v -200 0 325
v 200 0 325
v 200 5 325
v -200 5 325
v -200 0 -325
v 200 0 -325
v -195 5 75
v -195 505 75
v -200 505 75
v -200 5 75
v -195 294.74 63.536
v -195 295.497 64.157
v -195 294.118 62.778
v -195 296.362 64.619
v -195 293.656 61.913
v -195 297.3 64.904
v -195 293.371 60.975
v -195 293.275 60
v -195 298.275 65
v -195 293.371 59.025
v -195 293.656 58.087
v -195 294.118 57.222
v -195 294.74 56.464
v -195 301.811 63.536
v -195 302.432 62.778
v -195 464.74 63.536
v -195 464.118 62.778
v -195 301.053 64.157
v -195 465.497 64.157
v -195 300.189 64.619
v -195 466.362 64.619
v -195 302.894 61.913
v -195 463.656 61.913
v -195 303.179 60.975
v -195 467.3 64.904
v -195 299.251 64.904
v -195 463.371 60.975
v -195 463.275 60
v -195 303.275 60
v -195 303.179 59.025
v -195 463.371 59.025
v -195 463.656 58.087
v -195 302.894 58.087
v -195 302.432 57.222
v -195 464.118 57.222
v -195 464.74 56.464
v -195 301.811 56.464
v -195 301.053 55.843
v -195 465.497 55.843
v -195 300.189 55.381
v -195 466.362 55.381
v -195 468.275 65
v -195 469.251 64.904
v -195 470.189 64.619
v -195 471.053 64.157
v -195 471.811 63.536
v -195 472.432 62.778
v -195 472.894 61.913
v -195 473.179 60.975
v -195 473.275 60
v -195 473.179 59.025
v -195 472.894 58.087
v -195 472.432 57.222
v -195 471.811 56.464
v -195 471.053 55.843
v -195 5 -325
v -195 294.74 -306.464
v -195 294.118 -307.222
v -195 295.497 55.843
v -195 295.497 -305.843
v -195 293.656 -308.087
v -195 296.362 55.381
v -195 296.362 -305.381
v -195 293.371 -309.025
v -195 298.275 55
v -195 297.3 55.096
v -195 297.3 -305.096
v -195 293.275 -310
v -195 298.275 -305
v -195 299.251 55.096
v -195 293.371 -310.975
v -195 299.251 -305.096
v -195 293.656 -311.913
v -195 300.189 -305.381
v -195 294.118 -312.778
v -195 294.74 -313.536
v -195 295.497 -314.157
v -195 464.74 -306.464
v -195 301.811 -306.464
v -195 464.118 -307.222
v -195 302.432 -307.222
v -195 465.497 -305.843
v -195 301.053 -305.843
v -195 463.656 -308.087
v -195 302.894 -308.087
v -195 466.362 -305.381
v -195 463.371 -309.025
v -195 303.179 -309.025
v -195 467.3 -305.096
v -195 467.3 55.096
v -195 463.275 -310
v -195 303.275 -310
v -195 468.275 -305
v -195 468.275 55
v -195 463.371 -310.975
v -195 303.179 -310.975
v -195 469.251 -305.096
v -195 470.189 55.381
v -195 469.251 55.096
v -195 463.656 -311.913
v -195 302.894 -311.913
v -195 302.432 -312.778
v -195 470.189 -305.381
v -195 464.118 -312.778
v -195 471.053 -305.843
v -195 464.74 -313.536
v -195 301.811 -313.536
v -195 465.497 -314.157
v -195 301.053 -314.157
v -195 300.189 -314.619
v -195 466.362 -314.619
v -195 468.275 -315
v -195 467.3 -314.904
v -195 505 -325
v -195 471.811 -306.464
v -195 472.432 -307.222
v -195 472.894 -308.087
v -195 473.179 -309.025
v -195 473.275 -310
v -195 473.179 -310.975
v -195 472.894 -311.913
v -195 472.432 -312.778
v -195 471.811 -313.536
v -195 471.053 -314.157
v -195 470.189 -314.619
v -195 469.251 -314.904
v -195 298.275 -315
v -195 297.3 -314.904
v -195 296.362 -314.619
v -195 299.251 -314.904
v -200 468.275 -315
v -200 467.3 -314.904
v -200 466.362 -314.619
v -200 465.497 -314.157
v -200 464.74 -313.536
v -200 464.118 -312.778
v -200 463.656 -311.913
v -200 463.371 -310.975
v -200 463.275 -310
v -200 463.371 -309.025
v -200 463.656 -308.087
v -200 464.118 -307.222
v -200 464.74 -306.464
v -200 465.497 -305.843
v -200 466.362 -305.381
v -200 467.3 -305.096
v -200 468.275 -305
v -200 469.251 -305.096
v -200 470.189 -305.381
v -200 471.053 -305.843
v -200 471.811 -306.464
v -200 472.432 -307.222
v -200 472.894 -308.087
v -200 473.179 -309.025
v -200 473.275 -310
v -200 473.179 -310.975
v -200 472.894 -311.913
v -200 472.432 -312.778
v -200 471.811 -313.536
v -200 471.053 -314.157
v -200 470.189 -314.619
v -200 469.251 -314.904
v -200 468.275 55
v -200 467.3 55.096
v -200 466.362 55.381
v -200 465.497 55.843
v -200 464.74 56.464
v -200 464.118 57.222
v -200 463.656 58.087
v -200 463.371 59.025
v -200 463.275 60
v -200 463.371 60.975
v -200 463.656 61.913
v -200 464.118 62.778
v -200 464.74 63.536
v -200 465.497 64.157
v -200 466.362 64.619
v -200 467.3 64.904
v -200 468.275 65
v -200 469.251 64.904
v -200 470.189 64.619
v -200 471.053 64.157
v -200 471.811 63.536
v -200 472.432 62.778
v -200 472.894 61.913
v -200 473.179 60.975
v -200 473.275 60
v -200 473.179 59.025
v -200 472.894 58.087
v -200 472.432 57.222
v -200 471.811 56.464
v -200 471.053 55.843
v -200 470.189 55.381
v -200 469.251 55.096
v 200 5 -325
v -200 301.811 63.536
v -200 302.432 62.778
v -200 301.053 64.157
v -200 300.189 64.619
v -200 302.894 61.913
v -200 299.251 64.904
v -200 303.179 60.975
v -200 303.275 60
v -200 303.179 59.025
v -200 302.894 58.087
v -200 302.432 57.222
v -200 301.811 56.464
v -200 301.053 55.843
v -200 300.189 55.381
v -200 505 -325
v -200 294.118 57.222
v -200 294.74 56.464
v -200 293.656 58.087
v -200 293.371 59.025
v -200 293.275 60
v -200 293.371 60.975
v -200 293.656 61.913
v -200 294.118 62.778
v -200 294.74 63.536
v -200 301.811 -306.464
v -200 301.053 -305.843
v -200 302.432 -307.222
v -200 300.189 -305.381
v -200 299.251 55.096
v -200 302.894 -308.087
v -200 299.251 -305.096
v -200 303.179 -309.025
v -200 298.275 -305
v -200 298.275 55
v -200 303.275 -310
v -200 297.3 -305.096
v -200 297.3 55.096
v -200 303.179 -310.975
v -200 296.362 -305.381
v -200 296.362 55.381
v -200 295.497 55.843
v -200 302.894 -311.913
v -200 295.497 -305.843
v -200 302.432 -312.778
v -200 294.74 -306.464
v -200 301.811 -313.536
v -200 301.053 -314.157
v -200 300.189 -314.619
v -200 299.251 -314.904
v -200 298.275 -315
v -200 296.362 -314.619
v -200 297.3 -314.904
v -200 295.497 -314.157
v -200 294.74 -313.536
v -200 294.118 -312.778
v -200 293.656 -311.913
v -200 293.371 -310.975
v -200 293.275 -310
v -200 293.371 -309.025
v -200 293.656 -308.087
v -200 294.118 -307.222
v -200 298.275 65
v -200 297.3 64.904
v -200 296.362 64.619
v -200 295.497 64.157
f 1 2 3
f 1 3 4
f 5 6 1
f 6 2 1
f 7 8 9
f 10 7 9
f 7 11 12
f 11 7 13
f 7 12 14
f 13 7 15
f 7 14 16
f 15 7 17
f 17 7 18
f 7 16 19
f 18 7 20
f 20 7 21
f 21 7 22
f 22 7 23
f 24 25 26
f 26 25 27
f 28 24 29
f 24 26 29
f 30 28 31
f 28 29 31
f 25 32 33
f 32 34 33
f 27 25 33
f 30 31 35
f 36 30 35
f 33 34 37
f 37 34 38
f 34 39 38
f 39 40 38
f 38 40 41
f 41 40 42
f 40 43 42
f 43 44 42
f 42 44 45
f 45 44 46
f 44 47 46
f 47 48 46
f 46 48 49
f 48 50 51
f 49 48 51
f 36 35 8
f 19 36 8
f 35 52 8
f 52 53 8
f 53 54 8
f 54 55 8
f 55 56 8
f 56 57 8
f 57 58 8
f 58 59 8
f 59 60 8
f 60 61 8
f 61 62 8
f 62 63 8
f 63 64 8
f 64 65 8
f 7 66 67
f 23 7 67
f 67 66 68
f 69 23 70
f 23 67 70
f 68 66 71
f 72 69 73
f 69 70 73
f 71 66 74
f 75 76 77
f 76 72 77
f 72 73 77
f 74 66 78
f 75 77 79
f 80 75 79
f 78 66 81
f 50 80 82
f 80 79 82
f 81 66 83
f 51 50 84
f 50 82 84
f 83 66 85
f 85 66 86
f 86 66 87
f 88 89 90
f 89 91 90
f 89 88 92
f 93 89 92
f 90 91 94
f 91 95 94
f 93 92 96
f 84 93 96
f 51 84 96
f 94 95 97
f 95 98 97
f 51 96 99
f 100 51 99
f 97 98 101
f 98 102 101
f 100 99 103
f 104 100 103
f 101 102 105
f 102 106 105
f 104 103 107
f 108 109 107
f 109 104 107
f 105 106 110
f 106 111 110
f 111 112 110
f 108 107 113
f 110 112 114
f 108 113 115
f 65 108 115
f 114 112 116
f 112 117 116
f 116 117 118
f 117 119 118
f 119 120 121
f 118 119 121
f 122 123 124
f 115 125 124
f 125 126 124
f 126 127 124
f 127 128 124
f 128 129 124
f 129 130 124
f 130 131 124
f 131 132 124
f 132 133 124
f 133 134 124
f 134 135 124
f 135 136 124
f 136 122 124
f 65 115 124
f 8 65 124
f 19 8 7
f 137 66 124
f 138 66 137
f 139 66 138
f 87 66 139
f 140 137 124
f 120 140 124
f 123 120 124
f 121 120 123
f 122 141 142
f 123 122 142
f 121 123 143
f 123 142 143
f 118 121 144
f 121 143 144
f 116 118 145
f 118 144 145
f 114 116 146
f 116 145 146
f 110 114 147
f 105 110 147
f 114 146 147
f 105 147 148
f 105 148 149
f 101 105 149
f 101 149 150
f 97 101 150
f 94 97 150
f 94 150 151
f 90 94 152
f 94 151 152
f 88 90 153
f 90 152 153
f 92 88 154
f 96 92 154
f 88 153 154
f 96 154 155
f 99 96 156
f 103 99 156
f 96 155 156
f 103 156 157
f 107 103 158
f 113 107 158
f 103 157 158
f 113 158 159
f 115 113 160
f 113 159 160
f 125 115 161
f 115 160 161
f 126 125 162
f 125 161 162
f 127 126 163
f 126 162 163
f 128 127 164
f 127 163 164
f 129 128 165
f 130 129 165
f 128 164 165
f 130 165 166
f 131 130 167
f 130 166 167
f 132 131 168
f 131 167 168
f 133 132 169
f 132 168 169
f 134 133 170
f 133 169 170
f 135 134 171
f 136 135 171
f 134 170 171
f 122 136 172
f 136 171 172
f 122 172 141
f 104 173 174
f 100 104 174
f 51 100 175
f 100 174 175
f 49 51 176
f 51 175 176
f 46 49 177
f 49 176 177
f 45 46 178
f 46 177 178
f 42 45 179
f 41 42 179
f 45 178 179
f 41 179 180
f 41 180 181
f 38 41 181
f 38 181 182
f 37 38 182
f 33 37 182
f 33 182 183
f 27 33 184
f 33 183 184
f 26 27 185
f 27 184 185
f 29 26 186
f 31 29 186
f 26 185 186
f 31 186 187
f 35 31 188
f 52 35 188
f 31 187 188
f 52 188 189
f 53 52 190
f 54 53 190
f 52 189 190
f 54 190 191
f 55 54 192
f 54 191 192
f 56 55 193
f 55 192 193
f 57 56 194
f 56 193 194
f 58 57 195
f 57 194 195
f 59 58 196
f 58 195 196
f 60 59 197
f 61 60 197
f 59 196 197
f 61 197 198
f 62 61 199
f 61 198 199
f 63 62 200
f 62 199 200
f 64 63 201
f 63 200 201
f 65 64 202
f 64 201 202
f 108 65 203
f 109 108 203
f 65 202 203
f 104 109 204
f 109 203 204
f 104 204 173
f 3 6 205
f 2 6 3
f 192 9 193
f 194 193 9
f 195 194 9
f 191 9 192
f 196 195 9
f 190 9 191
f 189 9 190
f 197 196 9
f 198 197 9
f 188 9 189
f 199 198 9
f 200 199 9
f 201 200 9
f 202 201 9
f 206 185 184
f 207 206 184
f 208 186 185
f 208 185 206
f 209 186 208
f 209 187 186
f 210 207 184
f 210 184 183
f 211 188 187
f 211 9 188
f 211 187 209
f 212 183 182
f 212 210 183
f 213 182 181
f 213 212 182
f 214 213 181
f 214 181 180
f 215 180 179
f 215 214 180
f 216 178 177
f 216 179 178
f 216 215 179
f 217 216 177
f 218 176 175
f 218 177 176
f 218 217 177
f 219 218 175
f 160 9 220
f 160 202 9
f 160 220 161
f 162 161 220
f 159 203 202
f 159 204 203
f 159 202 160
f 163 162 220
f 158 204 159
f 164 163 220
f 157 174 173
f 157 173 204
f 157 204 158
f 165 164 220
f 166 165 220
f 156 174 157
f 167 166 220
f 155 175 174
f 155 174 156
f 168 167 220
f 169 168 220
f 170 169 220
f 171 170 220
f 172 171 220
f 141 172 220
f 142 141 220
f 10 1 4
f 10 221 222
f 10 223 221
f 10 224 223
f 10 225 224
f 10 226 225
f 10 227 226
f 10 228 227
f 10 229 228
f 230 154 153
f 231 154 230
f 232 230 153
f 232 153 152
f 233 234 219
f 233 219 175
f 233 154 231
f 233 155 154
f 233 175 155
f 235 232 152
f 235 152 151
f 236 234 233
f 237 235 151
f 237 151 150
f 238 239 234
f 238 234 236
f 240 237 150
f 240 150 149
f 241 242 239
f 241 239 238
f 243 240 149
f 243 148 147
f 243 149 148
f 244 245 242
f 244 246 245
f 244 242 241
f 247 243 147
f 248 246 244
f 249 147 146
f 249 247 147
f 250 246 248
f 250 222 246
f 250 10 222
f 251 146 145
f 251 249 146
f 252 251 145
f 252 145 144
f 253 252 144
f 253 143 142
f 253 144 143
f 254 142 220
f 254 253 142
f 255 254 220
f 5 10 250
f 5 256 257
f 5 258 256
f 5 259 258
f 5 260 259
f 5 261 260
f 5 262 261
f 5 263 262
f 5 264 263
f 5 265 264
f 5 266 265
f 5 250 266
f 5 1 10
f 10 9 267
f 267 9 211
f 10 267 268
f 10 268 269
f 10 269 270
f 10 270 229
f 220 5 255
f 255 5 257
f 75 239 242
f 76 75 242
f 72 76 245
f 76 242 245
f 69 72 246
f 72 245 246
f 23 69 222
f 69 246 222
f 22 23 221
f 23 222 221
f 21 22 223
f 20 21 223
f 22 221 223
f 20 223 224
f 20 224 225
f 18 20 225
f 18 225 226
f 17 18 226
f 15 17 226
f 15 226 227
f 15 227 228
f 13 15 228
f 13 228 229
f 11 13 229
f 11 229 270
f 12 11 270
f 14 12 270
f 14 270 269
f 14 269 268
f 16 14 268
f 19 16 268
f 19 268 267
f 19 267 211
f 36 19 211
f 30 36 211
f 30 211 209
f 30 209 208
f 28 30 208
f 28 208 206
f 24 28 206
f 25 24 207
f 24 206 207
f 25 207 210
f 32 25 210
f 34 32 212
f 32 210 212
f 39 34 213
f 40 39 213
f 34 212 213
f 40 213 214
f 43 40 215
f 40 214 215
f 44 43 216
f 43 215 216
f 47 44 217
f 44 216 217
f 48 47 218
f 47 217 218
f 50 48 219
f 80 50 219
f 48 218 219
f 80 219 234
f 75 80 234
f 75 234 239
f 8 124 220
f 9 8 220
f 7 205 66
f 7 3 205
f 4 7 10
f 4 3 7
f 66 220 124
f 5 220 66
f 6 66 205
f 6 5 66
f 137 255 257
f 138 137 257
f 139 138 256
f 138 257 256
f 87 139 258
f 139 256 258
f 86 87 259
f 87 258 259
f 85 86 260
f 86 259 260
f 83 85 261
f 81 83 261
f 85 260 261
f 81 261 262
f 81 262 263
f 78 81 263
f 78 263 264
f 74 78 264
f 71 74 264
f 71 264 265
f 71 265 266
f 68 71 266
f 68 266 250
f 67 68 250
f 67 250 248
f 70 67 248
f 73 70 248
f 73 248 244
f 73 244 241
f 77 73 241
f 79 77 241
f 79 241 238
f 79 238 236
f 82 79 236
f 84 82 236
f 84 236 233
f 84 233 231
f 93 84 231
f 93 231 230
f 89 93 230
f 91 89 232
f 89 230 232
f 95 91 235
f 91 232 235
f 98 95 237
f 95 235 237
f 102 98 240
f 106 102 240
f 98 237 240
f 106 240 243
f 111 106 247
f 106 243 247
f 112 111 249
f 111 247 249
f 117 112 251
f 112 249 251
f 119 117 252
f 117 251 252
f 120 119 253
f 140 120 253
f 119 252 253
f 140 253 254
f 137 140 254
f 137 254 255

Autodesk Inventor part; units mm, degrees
ref_plane "YZ Plane" through (0, 0, 0) normal (1, 0, 0) x (0, 1, 0)
ref_plane "XZ Plane" through (0, 0, 0) normal (0, 1, 0) x (-1, 0, 0)
ref_plane "XY Plane" through (0, 0, 0) normal (0, 0, 1) x (1, 0, 0)
sketch "Sketch1" plane through (0, 0, 0) normal (0, 1, 0) x (-1, 0, 0)
  line L0 (-200, 325) -> (200, 325)
  line L1 (200, 325) -> (200, -325)
  line L2 (200, -325) -> (-200, -325)
  line L3 (-200, -325) -> (-200, 325)
  line L4 (-200, 325) -> (200, -325) construction
  line L5 (200, 325) -> (-200, -325) construction
  point P0 (0, 0)
  dimension "d0" = 650
  dimension "d1" = 400
extrude "Extrusion1" add sketch "Sketch1" along normal blind 5
sketch "Sketch2" plane through (200, 0, -325) normal (0, 0, -1) x (-1, 0, 0)
  line L0 (0, 5) -> (400, 5) projected
  line L1 (400, 5) -> (395, 5)
  line L2 (395, 5) -> (395, 505)
  line L3 (395, 505) -> (400, 505)
  line L4 (400, 505) -> (400, 5)
  point P0 (200, 0)
  dimension "d4" = 5
  dimension "d5" = 500
extrude "Extrusion2" add sketch "Sketch2" against normal blind 400
sketch "Sketch3" plane through (-195, 5, -325) normal (1, 0, 0) x (0, 0, -1)
  line L0 (-400, 0) -> (-400, 500) projected
  line L1 (0, 500) -> (0, 0) projected
  point P0 (-325, -5)
  point P1 (-385, 463.2751)
  point P2 (-15, 463.2751)
  point P3 (-15, 293.2751)
  point P4 (-385, 293.2751)
  dimension "d8" = 15
  dimension "d9" = 15
  dimension "d10" = 170
hole "Hole1" at (-195, 468.2751, 60) at (-195, 468.2751, -310) at (-195, 298.2751, -310) at (-195, 298.2751, 60) direction (-1, 0, 0) diameter 10 end through all
properties part number "df"
